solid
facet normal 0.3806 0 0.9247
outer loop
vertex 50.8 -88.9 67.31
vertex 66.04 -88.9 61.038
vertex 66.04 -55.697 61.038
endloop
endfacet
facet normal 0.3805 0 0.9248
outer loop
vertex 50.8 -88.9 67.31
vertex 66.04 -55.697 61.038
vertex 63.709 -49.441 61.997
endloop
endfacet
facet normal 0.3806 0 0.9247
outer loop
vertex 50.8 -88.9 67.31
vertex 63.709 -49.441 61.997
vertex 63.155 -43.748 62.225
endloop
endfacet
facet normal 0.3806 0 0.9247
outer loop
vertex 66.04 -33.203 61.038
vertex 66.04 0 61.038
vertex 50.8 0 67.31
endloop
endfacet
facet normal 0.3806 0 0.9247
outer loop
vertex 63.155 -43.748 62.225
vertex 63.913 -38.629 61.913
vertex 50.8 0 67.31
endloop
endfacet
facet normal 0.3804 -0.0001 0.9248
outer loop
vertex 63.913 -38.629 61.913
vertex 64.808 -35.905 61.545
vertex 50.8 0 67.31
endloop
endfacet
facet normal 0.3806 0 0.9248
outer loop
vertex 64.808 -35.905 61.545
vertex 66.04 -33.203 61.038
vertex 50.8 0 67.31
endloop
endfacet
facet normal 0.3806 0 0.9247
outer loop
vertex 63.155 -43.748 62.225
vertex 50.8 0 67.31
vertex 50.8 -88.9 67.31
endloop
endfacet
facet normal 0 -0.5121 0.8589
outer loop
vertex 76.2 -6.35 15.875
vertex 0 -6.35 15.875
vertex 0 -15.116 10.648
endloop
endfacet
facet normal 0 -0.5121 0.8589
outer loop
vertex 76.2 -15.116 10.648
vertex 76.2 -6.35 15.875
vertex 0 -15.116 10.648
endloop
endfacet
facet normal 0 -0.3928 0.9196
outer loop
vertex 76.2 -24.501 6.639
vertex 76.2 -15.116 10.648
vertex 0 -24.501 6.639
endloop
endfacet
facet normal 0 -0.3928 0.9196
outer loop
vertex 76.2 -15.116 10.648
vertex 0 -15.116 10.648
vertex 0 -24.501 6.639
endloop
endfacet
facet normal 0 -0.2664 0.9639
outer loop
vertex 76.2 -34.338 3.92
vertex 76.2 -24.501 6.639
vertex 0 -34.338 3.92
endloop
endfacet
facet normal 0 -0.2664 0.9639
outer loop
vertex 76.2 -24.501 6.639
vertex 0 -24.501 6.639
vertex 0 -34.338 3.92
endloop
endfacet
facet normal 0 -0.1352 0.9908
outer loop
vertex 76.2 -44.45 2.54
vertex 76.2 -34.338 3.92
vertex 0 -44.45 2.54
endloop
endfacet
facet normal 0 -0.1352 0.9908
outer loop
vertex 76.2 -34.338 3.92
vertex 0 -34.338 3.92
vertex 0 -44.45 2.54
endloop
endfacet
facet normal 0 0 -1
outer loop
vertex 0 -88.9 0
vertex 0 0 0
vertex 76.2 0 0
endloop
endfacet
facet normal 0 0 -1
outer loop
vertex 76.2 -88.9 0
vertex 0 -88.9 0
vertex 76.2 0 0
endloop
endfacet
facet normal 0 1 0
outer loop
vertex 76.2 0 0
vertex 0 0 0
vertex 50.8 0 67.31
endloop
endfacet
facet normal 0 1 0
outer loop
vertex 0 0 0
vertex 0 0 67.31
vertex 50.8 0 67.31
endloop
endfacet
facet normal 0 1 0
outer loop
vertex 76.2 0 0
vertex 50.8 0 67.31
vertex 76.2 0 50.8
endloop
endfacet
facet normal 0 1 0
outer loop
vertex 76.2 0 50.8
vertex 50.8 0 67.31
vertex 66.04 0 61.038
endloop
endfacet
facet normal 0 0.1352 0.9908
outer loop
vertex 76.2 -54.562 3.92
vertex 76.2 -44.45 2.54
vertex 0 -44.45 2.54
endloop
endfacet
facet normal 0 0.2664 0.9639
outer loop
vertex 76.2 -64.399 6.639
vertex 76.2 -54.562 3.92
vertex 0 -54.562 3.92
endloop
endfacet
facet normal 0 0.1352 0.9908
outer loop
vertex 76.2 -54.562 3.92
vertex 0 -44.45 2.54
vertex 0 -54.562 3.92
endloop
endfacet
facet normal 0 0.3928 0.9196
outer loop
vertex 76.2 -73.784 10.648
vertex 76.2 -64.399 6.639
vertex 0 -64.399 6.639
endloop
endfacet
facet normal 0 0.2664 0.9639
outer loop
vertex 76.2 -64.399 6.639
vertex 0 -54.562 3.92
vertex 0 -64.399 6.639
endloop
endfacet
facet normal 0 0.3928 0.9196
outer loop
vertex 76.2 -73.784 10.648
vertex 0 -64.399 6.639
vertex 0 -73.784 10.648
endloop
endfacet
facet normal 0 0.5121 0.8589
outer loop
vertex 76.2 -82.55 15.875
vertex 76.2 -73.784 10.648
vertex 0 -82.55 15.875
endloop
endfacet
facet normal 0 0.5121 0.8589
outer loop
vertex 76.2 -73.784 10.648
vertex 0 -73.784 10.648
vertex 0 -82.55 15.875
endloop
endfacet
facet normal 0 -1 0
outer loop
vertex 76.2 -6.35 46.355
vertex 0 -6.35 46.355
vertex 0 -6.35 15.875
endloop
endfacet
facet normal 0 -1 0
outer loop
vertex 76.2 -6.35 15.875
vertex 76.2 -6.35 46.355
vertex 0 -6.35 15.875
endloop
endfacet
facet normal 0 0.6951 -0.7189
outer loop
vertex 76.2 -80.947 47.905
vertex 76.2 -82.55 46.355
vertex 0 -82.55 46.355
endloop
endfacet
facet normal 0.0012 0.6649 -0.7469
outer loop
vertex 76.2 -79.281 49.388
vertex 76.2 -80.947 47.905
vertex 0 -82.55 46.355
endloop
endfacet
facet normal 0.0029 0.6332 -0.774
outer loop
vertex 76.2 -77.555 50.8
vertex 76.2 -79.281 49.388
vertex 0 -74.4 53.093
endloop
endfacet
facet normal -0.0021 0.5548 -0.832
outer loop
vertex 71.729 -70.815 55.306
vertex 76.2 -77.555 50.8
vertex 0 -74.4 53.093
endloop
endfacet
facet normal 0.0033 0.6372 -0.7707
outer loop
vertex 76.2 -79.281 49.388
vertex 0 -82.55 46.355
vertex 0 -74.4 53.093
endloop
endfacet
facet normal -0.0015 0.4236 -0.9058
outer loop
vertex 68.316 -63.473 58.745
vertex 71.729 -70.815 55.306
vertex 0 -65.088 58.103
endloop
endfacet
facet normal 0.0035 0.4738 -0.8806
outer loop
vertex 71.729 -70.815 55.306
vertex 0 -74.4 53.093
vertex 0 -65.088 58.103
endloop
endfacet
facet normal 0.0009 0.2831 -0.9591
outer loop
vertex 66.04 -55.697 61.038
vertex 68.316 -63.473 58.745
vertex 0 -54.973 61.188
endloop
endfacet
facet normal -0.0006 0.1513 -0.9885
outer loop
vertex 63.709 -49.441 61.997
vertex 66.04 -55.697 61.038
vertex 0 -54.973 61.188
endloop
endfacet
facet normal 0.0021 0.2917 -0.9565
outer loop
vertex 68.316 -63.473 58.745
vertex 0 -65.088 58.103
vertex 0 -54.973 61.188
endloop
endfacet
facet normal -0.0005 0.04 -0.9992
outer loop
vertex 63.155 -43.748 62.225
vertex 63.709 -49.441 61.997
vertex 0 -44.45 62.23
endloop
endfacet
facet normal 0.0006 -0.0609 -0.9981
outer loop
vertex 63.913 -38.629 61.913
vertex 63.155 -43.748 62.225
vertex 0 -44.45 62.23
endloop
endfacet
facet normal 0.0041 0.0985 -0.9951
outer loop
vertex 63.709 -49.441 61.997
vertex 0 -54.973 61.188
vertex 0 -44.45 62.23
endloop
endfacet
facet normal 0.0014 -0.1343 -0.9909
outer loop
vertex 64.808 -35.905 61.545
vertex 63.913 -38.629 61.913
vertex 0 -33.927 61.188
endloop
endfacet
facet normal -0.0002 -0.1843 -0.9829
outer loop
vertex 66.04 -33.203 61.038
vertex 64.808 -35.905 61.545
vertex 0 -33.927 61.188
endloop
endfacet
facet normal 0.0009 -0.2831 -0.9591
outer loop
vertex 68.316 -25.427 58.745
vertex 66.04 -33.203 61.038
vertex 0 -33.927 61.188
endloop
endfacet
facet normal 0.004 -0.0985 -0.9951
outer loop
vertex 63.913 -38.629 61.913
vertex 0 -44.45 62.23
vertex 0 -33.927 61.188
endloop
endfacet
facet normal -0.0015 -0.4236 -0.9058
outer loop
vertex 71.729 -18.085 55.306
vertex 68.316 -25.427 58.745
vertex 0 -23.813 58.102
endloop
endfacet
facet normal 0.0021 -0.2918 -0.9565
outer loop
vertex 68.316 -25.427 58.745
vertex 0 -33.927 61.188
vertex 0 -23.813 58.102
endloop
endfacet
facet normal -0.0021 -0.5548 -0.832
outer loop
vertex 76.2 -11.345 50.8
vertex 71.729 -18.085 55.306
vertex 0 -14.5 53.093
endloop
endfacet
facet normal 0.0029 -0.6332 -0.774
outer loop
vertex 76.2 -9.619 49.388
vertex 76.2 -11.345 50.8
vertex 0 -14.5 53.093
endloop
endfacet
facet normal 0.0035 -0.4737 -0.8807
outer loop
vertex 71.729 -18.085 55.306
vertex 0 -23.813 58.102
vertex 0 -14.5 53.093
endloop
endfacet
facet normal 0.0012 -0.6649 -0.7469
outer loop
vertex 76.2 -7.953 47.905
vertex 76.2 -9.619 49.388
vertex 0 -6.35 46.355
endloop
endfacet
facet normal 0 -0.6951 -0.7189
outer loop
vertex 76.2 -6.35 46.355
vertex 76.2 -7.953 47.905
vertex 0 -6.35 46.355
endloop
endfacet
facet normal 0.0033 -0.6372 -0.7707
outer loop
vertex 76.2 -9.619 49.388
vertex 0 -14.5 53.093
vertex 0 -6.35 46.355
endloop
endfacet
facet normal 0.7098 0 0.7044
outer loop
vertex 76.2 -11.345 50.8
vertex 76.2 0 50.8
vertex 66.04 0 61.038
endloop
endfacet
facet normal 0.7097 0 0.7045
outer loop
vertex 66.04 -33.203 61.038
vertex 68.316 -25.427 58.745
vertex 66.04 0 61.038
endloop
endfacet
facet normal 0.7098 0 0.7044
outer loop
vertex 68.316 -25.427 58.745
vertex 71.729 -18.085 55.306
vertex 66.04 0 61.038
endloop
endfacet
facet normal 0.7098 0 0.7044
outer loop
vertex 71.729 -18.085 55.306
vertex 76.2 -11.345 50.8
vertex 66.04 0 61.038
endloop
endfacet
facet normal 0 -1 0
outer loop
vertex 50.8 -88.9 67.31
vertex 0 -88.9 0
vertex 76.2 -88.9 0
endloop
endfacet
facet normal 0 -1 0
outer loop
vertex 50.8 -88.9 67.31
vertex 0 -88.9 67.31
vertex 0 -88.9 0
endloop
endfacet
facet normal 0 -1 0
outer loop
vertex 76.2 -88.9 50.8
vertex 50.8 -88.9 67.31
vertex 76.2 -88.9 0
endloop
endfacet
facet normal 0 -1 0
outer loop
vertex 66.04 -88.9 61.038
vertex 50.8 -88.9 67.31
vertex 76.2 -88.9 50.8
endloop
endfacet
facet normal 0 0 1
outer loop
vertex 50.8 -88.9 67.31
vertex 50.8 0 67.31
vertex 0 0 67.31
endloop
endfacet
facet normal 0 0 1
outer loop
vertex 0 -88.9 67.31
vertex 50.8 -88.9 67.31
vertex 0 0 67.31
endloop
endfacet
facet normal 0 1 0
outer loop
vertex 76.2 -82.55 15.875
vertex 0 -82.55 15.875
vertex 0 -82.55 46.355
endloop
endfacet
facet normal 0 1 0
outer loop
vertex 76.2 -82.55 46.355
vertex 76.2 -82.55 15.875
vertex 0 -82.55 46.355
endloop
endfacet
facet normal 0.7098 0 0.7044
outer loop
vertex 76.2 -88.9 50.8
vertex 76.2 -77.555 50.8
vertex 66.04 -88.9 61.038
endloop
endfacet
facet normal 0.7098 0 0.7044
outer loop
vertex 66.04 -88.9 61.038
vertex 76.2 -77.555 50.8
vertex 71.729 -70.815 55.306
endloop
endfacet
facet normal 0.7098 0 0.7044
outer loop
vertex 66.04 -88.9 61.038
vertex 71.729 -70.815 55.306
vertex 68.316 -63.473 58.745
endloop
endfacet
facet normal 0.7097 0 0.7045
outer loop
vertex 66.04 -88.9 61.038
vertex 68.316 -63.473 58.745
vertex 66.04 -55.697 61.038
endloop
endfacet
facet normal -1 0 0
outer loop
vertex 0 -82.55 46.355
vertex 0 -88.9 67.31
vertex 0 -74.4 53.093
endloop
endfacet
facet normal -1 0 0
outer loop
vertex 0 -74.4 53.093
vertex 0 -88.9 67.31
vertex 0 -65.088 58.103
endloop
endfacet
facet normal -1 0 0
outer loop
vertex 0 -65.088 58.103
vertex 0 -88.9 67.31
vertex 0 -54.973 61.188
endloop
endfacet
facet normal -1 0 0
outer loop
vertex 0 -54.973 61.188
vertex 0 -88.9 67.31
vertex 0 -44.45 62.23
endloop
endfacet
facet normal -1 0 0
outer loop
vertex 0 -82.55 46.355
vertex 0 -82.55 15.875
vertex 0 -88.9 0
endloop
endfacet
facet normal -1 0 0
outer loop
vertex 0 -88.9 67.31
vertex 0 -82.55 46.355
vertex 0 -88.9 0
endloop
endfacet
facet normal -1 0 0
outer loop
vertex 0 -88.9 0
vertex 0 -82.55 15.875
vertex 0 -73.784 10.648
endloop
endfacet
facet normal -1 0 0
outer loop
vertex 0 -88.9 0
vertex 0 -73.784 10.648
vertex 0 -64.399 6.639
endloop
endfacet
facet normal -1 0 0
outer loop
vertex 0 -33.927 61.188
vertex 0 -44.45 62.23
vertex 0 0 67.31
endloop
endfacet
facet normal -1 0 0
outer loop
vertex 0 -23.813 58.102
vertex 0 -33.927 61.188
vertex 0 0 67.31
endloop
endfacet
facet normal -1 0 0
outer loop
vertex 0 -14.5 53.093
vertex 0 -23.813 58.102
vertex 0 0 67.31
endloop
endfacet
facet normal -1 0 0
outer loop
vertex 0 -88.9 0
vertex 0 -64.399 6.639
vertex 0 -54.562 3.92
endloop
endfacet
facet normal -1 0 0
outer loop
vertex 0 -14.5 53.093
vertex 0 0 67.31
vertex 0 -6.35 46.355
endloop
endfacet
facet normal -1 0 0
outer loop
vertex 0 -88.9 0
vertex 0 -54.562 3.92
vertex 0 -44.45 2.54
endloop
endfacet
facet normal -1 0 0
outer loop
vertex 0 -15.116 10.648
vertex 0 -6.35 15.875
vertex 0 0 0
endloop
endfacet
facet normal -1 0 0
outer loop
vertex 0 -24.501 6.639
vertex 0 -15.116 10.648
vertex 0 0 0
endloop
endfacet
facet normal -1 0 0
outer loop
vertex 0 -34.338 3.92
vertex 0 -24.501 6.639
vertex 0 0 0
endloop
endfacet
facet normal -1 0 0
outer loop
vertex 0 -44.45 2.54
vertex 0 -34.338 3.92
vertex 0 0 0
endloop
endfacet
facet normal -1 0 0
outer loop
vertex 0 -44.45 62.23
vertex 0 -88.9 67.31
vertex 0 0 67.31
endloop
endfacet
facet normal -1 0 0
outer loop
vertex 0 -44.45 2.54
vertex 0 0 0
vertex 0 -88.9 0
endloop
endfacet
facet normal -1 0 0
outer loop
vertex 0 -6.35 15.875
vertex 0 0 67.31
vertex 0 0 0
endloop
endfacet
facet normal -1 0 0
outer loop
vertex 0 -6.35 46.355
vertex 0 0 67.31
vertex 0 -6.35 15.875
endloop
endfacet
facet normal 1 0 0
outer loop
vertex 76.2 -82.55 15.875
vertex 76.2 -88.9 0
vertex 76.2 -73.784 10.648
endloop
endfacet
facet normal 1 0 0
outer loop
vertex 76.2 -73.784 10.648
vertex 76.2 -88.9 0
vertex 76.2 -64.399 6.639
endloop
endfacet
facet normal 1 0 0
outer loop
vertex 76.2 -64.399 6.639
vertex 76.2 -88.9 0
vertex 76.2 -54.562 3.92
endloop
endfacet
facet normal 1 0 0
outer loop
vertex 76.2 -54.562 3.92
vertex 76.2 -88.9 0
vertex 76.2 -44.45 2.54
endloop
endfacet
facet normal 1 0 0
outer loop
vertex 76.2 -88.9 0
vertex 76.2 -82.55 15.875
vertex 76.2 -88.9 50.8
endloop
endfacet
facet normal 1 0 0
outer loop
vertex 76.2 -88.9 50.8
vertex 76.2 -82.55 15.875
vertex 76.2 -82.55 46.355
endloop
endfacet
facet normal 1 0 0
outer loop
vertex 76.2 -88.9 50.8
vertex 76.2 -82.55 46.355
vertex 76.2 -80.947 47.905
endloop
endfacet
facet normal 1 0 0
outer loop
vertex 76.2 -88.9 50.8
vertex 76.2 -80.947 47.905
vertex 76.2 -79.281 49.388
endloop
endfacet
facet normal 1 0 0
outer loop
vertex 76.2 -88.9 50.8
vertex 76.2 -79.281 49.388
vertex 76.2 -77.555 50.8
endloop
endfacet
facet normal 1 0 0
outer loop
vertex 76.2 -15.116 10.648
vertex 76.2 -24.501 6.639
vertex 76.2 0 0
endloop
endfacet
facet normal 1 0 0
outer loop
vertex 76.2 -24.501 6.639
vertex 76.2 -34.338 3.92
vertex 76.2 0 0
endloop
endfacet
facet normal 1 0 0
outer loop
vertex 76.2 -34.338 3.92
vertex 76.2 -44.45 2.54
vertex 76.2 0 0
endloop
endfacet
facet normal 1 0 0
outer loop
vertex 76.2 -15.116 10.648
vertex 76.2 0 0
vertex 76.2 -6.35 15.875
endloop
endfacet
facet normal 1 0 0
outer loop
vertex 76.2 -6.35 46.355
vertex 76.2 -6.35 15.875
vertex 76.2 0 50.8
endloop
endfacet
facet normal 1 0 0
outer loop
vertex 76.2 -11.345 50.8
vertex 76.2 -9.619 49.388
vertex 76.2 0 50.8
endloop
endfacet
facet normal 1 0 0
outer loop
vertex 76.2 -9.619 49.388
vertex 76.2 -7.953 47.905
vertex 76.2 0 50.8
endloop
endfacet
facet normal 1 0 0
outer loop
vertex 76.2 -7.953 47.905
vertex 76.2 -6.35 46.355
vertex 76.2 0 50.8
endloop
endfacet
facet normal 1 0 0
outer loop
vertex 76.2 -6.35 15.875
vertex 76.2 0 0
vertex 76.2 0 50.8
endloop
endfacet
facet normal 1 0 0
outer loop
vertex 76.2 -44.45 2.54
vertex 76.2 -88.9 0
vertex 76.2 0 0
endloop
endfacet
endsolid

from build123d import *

# Parameters (mm, degrees)
F1_DEPTH = 88.9
F3_DEPTH = 76.201


with BuildPart() as f1:
    # F0 (on Front) → F1 (new body)
    with BuildSketch(Plane.XZ):
        Polygon((0, 61.038002), (0, 0), (76.2, 0), (76.2, 50.8), (66.04, 61.038002), align=None)
        Polygon((0, 67.31), (0, 61.038002), (66.04, 61.038002), (50.8, 67.31), align=None)
    extrude(amount=F1_DEPTH)

    # F2 (on face) → F3 (cut, through all)
    with BuildSketch(Plane(origin=(0, 0, 0), x_dir=(0, -1, 0), z_dir=(-1, 0, 0))):
        with BuildLine():
            ThreePointArc((6.35, 15.875), (24.500933, 6.638738), (44.45, 2.54))
            ThreePointArc((44.45, 2.54), (64.399067, 6.638738), (82.55, 15.875))
            Line((82.55, 15.875), (82.55, 33.655))
            Line((82.55, 33.655), (82.55, 46.355))
            ThreePointArc((82.55, 46.355), (65.0875, 58.1025), (44.45, 62.23))
            ThreePointArc((44.45, 62.23), (23.8125, 58.1025), (6.35, 46.355))
            Line((6.35, 46.355), (6.35, 33.655))
            Line((6.35, 33.655), (6.35, 15.875))
        make_face()
    extrude(amount=-F3_DEPTH, mode=Mode.SUBTRACT)


solid = f1.part
